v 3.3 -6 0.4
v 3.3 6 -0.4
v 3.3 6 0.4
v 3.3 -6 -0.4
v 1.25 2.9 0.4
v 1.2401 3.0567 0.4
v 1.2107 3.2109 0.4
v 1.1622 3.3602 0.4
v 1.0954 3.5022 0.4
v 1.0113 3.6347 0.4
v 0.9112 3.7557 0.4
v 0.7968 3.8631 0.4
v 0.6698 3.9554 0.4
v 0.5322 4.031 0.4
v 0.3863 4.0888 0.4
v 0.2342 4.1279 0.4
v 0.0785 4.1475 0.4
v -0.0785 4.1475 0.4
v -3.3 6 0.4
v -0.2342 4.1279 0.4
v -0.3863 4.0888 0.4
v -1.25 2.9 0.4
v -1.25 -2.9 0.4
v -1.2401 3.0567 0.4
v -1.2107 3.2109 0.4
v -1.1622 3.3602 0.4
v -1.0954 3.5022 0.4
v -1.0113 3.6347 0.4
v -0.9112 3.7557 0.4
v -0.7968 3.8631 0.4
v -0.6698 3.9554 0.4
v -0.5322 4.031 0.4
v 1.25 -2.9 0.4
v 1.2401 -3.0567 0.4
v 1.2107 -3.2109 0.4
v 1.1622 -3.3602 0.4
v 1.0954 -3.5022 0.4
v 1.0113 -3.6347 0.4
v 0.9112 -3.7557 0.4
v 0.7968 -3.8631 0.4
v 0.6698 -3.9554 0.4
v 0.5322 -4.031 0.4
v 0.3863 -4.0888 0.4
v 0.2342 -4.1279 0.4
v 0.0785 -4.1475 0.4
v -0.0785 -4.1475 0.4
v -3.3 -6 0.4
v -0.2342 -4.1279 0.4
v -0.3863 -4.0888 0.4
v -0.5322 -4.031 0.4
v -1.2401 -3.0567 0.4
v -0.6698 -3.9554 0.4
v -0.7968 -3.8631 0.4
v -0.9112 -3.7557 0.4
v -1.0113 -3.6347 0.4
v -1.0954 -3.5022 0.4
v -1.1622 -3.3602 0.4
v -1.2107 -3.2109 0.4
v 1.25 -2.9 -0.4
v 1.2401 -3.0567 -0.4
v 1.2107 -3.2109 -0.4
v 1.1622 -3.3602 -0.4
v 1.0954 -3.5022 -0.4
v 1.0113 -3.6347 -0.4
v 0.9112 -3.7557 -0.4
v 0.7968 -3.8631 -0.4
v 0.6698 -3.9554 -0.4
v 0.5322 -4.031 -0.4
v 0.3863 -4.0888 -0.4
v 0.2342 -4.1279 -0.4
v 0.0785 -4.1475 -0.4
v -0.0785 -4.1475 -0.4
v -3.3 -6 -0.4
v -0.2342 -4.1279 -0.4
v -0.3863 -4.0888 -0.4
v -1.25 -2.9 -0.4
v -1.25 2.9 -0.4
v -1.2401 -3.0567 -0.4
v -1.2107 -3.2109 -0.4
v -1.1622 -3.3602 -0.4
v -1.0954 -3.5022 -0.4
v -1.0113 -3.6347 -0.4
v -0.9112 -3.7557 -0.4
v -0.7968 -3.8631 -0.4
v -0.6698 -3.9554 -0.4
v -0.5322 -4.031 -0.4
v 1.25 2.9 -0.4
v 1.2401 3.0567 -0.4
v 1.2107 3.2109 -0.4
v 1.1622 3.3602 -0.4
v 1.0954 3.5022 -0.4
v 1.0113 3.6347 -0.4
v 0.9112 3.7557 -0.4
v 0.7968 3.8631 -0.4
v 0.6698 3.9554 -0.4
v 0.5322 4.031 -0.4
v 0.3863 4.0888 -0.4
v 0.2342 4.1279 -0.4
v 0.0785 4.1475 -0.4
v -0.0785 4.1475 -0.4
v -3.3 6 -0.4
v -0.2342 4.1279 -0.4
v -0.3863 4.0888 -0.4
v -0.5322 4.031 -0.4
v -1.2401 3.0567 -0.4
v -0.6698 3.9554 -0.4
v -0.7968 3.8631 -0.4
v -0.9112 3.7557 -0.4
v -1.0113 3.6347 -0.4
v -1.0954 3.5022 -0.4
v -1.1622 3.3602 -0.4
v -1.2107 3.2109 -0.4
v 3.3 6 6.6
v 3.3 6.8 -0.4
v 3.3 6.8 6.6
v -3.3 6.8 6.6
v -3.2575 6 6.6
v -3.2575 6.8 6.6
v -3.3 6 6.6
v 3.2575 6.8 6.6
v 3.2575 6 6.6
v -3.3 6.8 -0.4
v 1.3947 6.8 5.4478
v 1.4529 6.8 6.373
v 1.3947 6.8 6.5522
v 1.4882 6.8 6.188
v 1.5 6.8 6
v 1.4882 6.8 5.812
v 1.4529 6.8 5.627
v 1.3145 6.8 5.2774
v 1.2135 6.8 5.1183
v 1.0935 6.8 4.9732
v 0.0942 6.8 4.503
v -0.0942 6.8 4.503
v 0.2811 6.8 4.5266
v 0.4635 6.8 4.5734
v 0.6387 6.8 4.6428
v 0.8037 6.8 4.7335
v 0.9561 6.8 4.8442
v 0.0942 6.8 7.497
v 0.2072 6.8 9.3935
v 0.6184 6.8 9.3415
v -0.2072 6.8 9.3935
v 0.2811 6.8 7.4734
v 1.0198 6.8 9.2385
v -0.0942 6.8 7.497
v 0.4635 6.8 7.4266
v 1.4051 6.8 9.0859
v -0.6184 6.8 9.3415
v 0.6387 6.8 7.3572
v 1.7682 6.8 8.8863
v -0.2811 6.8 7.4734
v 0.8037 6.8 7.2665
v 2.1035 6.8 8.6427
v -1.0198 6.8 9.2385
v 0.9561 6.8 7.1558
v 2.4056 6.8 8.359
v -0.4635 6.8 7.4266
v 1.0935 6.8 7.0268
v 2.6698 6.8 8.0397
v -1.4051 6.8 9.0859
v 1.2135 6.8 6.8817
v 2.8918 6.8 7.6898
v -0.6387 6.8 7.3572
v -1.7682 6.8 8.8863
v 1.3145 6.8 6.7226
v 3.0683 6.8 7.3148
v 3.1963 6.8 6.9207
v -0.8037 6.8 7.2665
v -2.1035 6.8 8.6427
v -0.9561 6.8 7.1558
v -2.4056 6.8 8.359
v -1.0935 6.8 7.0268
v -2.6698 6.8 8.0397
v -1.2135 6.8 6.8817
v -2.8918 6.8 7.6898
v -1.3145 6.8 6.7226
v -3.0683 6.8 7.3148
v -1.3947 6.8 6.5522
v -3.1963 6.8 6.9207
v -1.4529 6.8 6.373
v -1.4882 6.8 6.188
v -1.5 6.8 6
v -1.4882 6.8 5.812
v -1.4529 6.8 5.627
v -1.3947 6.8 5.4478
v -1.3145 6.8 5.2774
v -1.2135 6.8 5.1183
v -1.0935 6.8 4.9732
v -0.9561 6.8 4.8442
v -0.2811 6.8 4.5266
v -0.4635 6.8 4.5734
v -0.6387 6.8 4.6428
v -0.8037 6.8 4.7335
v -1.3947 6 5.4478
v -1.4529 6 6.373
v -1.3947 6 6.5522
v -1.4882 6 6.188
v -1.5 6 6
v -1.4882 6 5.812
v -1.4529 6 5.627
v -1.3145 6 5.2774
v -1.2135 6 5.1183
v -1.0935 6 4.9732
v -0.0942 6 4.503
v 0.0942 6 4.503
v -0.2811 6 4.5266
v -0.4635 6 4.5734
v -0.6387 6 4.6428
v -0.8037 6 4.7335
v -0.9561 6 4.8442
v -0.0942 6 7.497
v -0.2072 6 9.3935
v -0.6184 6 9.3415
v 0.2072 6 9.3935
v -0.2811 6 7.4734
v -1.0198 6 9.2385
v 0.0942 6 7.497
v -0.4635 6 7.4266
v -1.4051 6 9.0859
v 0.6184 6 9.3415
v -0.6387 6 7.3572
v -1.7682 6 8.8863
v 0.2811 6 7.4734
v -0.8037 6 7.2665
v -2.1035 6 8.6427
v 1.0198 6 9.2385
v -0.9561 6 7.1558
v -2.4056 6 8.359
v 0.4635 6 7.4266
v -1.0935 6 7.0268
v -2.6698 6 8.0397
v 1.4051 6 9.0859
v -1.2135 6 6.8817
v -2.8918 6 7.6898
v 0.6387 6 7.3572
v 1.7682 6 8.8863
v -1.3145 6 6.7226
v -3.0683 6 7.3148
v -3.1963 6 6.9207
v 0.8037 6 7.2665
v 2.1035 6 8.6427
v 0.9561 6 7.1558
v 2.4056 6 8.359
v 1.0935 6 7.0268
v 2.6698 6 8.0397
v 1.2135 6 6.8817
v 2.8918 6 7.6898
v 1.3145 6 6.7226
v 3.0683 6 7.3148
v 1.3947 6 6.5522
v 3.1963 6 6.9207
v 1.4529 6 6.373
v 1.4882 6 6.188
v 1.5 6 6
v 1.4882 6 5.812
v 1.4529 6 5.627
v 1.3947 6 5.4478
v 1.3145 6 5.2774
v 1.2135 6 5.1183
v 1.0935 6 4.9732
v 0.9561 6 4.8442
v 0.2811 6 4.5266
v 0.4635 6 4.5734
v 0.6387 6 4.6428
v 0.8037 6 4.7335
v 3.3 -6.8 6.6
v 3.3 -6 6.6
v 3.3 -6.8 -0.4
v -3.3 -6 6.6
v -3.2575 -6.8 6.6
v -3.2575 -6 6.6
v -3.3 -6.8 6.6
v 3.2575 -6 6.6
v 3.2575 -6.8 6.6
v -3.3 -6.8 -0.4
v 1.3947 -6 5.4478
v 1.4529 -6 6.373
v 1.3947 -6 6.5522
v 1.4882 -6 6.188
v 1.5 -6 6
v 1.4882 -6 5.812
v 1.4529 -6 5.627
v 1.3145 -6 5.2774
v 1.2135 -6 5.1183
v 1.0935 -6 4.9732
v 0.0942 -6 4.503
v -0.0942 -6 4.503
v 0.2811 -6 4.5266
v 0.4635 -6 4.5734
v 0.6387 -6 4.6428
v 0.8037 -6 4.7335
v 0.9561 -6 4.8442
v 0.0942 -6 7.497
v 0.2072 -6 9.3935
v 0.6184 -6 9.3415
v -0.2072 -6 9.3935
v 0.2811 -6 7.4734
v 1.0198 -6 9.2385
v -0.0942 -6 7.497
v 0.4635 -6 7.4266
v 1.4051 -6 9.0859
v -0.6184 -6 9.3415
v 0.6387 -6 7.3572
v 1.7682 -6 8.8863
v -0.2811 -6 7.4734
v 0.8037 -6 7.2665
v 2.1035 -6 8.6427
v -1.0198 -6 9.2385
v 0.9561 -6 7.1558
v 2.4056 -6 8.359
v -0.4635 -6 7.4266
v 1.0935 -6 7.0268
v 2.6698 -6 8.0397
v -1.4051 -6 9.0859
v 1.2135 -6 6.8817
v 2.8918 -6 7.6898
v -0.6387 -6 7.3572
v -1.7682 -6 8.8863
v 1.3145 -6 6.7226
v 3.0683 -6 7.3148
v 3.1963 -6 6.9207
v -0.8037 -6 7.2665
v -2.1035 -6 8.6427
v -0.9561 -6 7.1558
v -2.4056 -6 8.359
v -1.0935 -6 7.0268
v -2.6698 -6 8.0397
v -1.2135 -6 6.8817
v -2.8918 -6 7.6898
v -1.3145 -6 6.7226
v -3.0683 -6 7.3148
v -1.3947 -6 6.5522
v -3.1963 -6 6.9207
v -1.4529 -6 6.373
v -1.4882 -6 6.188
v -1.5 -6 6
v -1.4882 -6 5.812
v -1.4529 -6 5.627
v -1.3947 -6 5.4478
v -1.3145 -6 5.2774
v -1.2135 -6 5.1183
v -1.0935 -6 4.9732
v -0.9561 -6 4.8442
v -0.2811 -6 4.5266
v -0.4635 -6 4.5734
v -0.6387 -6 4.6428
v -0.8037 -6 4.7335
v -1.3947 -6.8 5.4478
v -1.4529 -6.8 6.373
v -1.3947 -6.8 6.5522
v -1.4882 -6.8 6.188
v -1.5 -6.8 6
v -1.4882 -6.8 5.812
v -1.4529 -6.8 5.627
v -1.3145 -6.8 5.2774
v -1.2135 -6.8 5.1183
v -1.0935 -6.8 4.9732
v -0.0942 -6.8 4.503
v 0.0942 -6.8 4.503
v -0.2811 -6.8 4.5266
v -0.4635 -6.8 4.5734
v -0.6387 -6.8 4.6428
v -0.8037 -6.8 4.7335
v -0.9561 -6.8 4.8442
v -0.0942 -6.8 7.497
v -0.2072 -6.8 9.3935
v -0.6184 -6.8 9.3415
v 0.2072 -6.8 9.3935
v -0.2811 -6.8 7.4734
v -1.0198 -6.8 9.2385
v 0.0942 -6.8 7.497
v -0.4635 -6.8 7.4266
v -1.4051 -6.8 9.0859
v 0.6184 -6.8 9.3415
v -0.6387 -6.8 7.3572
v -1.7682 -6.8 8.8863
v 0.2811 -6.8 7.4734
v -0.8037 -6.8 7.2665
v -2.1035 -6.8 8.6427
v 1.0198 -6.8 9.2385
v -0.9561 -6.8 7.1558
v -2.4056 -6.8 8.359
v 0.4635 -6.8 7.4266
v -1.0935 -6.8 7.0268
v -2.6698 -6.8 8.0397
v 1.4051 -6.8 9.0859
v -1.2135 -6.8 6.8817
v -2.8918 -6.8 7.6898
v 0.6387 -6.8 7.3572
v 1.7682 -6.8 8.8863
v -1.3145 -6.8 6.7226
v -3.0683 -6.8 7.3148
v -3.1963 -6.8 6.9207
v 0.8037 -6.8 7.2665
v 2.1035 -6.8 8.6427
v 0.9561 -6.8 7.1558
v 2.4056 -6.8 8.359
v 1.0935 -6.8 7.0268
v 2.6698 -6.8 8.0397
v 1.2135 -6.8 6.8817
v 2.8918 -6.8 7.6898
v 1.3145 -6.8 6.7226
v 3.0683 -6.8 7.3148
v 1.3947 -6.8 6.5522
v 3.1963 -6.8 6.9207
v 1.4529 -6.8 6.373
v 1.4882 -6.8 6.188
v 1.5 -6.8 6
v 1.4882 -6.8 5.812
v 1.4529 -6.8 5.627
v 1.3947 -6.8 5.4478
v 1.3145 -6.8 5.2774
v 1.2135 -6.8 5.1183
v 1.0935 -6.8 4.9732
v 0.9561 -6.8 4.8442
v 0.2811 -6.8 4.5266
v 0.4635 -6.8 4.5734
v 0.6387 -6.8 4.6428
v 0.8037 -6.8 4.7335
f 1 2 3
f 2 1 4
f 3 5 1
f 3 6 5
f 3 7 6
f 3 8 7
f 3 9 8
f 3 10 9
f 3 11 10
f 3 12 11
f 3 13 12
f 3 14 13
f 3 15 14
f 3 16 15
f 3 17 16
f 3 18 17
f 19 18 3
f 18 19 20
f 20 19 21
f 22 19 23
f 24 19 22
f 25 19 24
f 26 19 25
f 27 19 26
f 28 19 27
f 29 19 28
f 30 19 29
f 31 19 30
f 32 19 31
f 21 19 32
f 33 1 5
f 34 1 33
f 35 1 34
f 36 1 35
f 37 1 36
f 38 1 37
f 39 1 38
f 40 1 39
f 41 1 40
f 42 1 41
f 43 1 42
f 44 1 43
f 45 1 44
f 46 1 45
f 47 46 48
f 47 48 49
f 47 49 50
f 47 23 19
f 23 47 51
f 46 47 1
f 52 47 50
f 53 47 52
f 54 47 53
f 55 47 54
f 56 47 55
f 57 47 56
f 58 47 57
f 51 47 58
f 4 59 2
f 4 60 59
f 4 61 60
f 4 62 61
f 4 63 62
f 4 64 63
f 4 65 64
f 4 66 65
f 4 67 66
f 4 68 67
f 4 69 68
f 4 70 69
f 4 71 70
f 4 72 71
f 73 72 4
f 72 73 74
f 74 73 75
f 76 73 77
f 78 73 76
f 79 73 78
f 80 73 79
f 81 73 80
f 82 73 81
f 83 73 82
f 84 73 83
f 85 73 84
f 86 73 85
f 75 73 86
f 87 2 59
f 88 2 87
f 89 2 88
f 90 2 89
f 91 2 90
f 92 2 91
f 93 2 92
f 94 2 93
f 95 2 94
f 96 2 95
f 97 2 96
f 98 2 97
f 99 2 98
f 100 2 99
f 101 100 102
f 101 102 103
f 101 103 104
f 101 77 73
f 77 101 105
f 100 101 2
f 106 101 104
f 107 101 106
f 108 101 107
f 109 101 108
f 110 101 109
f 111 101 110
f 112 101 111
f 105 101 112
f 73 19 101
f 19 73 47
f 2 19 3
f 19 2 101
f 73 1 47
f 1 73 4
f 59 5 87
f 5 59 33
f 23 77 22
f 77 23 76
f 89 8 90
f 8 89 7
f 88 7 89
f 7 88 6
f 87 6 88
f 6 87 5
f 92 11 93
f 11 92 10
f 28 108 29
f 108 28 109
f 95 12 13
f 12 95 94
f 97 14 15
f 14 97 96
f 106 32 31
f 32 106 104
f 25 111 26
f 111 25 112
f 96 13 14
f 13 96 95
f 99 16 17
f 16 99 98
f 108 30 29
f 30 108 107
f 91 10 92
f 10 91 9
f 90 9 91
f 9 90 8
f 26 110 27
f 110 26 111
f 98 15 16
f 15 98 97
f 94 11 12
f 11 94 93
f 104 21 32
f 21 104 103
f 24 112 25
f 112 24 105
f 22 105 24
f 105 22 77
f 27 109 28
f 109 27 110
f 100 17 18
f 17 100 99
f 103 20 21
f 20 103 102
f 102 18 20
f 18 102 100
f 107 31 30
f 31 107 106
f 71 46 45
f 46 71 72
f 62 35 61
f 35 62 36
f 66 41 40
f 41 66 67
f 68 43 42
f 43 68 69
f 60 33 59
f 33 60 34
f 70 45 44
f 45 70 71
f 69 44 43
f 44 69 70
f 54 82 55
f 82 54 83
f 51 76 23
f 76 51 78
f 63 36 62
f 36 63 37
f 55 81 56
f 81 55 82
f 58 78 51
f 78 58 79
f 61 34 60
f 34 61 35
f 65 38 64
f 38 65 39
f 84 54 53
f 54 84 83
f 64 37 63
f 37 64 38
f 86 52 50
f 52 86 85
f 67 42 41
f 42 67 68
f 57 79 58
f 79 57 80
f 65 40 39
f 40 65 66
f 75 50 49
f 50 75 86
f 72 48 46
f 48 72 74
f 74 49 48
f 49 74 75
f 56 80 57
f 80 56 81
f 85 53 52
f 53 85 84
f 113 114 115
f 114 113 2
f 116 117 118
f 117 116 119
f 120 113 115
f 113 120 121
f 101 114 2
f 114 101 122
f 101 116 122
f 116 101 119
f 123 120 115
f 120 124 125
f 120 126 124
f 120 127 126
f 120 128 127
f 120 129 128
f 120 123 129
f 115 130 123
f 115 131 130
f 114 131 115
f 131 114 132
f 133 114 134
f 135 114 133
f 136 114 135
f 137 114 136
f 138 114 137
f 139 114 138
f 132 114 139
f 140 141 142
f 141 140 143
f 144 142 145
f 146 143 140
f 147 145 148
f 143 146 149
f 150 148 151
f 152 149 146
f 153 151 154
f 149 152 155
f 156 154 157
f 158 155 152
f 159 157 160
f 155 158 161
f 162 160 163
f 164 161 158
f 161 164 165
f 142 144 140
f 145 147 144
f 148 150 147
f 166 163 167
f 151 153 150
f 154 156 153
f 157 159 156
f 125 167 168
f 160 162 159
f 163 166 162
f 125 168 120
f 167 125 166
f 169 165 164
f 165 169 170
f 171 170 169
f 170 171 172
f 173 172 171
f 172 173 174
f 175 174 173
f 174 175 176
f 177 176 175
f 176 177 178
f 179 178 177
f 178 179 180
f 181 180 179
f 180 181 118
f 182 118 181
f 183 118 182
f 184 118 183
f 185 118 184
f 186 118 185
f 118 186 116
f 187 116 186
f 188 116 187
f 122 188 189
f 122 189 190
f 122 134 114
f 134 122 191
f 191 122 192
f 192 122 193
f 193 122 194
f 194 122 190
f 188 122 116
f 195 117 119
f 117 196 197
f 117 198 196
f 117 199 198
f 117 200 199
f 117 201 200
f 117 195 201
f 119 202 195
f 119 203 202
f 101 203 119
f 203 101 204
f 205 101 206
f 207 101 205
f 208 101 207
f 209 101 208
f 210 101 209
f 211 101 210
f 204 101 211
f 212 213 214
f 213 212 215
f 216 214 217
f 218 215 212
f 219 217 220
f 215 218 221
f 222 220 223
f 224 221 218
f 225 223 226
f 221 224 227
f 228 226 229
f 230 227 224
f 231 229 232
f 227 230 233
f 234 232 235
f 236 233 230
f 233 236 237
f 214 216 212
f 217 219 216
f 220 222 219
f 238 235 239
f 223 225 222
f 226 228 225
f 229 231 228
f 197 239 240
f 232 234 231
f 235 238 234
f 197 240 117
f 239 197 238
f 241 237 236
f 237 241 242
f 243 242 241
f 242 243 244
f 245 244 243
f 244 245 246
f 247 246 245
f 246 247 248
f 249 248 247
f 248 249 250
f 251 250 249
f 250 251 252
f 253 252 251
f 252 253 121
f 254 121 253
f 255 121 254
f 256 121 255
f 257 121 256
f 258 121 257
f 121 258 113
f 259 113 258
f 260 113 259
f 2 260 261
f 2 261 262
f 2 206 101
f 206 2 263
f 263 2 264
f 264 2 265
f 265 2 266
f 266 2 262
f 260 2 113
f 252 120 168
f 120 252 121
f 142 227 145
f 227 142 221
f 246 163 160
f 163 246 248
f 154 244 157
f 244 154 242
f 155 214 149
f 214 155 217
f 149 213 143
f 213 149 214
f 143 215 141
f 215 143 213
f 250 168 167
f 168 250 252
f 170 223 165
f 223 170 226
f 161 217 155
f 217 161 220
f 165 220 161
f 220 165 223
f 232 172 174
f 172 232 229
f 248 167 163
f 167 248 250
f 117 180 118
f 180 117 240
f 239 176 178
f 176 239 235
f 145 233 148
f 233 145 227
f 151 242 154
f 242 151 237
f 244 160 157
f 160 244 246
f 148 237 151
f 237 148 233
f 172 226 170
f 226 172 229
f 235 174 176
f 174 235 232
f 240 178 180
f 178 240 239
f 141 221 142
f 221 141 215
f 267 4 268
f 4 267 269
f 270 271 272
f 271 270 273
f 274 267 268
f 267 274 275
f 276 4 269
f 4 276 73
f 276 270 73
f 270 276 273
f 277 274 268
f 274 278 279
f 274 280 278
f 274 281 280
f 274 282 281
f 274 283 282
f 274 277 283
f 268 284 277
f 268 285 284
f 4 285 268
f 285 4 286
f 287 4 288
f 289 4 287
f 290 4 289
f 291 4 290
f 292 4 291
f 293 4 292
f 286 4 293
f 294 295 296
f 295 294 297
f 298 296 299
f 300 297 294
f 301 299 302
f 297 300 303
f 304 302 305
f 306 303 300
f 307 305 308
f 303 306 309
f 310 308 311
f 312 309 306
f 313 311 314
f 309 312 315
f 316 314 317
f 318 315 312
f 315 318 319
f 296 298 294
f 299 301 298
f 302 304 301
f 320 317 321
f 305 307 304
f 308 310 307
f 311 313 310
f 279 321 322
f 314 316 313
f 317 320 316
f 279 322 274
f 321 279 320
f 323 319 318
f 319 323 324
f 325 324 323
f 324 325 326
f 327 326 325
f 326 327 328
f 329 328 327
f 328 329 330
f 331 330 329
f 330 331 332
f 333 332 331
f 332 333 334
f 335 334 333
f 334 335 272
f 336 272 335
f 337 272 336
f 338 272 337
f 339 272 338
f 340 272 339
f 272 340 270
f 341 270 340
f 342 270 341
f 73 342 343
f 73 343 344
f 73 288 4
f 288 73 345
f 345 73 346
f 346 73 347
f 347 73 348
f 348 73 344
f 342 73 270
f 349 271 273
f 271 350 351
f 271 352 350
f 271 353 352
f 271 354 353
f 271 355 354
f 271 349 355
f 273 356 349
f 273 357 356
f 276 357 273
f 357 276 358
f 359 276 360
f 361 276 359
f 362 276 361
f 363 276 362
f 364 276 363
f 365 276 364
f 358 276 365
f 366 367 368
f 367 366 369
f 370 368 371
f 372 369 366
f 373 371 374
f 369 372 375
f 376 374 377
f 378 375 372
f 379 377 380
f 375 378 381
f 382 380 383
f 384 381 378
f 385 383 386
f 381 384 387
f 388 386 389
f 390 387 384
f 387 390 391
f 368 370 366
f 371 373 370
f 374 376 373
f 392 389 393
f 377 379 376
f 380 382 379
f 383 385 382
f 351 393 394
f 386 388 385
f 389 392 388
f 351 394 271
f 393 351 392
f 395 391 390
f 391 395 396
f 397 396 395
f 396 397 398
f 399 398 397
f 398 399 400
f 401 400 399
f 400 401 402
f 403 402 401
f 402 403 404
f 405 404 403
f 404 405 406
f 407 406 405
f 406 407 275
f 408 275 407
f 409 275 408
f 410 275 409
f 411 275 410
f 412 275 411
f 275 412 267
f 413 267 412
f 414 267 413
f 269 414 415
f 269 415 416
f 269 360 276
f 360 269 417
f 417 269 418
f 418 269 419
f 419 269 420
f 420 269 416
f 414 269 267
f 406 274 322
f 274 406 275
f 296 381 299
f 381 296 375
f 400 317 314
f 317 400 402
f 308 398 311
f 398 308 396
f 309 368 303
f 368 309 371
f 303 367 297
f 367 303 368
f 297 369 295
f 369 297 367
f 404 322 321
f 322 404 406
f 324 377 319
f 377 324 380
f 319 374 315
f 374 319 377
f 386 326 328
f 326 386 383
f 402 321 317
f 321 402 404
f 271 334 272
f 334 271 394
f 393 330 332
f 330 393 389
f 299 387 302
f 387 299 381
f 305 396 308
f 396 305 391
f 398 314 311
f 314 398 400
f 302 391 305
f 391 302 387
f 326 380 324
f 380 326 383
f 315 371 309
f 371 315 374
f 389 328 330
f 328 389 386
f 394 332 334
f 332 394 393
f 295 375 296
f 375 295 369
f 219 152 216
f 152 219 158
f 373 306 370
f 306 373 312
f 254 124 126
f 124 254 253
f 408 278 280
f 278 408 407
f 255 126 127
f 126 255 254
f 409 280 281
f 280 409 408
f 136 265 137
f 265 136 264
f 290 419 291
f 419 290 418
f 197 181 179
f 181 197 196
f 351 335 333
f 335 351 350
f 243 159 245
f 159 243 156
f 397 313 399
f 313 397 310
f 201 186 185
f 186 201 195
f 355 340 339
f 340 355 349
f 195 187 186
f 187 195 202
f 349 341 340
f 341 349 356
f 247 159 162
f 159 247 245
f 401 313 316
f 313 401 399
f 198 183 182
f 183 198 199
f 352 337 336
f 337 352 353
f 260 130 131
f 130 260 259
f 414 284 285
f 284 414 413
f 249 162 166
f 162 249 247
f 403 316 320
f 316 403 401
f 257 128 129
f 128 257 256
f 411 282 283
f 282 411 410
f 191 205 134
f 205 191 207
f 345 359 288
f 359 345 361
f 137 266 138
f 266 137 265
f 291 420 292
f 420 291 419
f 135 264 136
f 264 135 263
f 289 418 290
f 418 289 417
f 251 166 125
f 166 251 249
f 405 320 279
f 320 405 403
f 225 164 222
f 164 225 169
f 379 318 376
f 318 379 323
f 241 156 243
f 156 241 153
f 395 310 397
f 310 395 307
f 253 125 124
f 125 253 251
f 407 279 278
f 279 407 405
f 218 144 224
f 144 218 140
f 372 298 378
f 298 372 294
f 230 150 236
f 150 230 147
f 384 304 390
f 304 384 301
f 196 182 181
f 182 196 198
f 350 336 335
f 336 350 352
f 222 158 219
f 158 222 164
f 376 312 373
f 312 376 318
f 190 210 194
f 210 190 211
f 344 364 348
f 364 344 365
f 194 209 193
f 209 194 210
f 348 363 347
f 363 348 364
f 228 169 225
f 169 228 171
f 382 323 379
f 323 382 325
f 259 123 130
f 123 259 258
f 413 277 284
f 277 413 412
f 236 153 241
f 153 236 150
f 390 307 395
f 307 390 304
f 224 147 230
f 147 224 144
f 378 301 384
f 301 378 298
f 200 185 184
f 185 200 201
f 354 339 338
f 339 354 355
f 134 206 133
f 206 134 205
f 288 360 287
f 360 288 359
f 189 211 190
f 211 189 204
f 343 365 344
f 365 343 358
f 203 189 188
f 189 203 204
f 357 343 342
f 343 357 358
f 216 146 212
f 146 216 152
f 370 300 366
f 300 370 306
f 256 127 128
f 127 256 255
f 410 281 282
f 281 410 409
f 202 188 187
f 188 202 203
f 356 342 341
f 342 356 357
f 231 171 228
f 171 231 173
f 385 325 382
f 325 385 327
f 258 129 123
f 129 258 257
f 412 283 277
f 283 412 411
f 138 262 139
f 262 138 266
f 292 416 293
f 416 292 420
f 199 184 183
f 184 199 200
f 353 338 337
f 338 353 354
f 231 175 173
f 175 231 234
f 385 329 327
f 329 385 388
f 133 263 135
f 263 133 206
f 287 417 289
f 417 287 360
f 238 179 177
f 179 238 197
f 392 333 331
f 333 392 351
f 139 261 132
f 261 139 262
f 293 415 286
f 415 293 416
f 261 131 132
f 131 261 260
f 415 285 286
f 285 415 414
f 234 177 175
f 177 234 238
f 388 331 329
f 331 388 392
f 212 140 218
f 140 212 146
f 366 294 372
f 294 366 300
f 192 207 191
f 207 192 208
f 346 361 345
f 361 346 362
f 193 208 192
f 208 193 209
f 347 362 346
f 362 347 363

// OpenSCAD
$fn=50;
thickness=0.8;

difference(){
    cube([6.6,12,thickness], true);
    cube([2.5,8.3-2.5,thickness+0.1],true);
    translate([0,(8.3-2.5)/2,0])
    cylinder(h=thickness+0.1,d=2.5, center = true);
    translate([0,-(8.3-2.5)/2,0])
    cylinder(h=thickness+0.1,d=2.5, center = true);
}
difference(){
union(){
    translate([0,12/2+thickness/2,3.5-thickness/2]){
        cube([6.6,thickness,7], true);
        translate([0,0,3])
        rotate([90,0,0])
        cylinder(h=thickness,d=6.6,center = true);
    }

    translate([0,-12/2-thickness/2,3.5-thickness/2]){
        cube([6.6,thickness,7], true);
        translate([0,0,3])
        rotate([90,0,0])
        cylinder(h=thickness,d=6.6,center = true);
    }
}

translate([0,0,6])
rotate([90,0,0])
cylinder(h=20,d=3,center = true);
}
